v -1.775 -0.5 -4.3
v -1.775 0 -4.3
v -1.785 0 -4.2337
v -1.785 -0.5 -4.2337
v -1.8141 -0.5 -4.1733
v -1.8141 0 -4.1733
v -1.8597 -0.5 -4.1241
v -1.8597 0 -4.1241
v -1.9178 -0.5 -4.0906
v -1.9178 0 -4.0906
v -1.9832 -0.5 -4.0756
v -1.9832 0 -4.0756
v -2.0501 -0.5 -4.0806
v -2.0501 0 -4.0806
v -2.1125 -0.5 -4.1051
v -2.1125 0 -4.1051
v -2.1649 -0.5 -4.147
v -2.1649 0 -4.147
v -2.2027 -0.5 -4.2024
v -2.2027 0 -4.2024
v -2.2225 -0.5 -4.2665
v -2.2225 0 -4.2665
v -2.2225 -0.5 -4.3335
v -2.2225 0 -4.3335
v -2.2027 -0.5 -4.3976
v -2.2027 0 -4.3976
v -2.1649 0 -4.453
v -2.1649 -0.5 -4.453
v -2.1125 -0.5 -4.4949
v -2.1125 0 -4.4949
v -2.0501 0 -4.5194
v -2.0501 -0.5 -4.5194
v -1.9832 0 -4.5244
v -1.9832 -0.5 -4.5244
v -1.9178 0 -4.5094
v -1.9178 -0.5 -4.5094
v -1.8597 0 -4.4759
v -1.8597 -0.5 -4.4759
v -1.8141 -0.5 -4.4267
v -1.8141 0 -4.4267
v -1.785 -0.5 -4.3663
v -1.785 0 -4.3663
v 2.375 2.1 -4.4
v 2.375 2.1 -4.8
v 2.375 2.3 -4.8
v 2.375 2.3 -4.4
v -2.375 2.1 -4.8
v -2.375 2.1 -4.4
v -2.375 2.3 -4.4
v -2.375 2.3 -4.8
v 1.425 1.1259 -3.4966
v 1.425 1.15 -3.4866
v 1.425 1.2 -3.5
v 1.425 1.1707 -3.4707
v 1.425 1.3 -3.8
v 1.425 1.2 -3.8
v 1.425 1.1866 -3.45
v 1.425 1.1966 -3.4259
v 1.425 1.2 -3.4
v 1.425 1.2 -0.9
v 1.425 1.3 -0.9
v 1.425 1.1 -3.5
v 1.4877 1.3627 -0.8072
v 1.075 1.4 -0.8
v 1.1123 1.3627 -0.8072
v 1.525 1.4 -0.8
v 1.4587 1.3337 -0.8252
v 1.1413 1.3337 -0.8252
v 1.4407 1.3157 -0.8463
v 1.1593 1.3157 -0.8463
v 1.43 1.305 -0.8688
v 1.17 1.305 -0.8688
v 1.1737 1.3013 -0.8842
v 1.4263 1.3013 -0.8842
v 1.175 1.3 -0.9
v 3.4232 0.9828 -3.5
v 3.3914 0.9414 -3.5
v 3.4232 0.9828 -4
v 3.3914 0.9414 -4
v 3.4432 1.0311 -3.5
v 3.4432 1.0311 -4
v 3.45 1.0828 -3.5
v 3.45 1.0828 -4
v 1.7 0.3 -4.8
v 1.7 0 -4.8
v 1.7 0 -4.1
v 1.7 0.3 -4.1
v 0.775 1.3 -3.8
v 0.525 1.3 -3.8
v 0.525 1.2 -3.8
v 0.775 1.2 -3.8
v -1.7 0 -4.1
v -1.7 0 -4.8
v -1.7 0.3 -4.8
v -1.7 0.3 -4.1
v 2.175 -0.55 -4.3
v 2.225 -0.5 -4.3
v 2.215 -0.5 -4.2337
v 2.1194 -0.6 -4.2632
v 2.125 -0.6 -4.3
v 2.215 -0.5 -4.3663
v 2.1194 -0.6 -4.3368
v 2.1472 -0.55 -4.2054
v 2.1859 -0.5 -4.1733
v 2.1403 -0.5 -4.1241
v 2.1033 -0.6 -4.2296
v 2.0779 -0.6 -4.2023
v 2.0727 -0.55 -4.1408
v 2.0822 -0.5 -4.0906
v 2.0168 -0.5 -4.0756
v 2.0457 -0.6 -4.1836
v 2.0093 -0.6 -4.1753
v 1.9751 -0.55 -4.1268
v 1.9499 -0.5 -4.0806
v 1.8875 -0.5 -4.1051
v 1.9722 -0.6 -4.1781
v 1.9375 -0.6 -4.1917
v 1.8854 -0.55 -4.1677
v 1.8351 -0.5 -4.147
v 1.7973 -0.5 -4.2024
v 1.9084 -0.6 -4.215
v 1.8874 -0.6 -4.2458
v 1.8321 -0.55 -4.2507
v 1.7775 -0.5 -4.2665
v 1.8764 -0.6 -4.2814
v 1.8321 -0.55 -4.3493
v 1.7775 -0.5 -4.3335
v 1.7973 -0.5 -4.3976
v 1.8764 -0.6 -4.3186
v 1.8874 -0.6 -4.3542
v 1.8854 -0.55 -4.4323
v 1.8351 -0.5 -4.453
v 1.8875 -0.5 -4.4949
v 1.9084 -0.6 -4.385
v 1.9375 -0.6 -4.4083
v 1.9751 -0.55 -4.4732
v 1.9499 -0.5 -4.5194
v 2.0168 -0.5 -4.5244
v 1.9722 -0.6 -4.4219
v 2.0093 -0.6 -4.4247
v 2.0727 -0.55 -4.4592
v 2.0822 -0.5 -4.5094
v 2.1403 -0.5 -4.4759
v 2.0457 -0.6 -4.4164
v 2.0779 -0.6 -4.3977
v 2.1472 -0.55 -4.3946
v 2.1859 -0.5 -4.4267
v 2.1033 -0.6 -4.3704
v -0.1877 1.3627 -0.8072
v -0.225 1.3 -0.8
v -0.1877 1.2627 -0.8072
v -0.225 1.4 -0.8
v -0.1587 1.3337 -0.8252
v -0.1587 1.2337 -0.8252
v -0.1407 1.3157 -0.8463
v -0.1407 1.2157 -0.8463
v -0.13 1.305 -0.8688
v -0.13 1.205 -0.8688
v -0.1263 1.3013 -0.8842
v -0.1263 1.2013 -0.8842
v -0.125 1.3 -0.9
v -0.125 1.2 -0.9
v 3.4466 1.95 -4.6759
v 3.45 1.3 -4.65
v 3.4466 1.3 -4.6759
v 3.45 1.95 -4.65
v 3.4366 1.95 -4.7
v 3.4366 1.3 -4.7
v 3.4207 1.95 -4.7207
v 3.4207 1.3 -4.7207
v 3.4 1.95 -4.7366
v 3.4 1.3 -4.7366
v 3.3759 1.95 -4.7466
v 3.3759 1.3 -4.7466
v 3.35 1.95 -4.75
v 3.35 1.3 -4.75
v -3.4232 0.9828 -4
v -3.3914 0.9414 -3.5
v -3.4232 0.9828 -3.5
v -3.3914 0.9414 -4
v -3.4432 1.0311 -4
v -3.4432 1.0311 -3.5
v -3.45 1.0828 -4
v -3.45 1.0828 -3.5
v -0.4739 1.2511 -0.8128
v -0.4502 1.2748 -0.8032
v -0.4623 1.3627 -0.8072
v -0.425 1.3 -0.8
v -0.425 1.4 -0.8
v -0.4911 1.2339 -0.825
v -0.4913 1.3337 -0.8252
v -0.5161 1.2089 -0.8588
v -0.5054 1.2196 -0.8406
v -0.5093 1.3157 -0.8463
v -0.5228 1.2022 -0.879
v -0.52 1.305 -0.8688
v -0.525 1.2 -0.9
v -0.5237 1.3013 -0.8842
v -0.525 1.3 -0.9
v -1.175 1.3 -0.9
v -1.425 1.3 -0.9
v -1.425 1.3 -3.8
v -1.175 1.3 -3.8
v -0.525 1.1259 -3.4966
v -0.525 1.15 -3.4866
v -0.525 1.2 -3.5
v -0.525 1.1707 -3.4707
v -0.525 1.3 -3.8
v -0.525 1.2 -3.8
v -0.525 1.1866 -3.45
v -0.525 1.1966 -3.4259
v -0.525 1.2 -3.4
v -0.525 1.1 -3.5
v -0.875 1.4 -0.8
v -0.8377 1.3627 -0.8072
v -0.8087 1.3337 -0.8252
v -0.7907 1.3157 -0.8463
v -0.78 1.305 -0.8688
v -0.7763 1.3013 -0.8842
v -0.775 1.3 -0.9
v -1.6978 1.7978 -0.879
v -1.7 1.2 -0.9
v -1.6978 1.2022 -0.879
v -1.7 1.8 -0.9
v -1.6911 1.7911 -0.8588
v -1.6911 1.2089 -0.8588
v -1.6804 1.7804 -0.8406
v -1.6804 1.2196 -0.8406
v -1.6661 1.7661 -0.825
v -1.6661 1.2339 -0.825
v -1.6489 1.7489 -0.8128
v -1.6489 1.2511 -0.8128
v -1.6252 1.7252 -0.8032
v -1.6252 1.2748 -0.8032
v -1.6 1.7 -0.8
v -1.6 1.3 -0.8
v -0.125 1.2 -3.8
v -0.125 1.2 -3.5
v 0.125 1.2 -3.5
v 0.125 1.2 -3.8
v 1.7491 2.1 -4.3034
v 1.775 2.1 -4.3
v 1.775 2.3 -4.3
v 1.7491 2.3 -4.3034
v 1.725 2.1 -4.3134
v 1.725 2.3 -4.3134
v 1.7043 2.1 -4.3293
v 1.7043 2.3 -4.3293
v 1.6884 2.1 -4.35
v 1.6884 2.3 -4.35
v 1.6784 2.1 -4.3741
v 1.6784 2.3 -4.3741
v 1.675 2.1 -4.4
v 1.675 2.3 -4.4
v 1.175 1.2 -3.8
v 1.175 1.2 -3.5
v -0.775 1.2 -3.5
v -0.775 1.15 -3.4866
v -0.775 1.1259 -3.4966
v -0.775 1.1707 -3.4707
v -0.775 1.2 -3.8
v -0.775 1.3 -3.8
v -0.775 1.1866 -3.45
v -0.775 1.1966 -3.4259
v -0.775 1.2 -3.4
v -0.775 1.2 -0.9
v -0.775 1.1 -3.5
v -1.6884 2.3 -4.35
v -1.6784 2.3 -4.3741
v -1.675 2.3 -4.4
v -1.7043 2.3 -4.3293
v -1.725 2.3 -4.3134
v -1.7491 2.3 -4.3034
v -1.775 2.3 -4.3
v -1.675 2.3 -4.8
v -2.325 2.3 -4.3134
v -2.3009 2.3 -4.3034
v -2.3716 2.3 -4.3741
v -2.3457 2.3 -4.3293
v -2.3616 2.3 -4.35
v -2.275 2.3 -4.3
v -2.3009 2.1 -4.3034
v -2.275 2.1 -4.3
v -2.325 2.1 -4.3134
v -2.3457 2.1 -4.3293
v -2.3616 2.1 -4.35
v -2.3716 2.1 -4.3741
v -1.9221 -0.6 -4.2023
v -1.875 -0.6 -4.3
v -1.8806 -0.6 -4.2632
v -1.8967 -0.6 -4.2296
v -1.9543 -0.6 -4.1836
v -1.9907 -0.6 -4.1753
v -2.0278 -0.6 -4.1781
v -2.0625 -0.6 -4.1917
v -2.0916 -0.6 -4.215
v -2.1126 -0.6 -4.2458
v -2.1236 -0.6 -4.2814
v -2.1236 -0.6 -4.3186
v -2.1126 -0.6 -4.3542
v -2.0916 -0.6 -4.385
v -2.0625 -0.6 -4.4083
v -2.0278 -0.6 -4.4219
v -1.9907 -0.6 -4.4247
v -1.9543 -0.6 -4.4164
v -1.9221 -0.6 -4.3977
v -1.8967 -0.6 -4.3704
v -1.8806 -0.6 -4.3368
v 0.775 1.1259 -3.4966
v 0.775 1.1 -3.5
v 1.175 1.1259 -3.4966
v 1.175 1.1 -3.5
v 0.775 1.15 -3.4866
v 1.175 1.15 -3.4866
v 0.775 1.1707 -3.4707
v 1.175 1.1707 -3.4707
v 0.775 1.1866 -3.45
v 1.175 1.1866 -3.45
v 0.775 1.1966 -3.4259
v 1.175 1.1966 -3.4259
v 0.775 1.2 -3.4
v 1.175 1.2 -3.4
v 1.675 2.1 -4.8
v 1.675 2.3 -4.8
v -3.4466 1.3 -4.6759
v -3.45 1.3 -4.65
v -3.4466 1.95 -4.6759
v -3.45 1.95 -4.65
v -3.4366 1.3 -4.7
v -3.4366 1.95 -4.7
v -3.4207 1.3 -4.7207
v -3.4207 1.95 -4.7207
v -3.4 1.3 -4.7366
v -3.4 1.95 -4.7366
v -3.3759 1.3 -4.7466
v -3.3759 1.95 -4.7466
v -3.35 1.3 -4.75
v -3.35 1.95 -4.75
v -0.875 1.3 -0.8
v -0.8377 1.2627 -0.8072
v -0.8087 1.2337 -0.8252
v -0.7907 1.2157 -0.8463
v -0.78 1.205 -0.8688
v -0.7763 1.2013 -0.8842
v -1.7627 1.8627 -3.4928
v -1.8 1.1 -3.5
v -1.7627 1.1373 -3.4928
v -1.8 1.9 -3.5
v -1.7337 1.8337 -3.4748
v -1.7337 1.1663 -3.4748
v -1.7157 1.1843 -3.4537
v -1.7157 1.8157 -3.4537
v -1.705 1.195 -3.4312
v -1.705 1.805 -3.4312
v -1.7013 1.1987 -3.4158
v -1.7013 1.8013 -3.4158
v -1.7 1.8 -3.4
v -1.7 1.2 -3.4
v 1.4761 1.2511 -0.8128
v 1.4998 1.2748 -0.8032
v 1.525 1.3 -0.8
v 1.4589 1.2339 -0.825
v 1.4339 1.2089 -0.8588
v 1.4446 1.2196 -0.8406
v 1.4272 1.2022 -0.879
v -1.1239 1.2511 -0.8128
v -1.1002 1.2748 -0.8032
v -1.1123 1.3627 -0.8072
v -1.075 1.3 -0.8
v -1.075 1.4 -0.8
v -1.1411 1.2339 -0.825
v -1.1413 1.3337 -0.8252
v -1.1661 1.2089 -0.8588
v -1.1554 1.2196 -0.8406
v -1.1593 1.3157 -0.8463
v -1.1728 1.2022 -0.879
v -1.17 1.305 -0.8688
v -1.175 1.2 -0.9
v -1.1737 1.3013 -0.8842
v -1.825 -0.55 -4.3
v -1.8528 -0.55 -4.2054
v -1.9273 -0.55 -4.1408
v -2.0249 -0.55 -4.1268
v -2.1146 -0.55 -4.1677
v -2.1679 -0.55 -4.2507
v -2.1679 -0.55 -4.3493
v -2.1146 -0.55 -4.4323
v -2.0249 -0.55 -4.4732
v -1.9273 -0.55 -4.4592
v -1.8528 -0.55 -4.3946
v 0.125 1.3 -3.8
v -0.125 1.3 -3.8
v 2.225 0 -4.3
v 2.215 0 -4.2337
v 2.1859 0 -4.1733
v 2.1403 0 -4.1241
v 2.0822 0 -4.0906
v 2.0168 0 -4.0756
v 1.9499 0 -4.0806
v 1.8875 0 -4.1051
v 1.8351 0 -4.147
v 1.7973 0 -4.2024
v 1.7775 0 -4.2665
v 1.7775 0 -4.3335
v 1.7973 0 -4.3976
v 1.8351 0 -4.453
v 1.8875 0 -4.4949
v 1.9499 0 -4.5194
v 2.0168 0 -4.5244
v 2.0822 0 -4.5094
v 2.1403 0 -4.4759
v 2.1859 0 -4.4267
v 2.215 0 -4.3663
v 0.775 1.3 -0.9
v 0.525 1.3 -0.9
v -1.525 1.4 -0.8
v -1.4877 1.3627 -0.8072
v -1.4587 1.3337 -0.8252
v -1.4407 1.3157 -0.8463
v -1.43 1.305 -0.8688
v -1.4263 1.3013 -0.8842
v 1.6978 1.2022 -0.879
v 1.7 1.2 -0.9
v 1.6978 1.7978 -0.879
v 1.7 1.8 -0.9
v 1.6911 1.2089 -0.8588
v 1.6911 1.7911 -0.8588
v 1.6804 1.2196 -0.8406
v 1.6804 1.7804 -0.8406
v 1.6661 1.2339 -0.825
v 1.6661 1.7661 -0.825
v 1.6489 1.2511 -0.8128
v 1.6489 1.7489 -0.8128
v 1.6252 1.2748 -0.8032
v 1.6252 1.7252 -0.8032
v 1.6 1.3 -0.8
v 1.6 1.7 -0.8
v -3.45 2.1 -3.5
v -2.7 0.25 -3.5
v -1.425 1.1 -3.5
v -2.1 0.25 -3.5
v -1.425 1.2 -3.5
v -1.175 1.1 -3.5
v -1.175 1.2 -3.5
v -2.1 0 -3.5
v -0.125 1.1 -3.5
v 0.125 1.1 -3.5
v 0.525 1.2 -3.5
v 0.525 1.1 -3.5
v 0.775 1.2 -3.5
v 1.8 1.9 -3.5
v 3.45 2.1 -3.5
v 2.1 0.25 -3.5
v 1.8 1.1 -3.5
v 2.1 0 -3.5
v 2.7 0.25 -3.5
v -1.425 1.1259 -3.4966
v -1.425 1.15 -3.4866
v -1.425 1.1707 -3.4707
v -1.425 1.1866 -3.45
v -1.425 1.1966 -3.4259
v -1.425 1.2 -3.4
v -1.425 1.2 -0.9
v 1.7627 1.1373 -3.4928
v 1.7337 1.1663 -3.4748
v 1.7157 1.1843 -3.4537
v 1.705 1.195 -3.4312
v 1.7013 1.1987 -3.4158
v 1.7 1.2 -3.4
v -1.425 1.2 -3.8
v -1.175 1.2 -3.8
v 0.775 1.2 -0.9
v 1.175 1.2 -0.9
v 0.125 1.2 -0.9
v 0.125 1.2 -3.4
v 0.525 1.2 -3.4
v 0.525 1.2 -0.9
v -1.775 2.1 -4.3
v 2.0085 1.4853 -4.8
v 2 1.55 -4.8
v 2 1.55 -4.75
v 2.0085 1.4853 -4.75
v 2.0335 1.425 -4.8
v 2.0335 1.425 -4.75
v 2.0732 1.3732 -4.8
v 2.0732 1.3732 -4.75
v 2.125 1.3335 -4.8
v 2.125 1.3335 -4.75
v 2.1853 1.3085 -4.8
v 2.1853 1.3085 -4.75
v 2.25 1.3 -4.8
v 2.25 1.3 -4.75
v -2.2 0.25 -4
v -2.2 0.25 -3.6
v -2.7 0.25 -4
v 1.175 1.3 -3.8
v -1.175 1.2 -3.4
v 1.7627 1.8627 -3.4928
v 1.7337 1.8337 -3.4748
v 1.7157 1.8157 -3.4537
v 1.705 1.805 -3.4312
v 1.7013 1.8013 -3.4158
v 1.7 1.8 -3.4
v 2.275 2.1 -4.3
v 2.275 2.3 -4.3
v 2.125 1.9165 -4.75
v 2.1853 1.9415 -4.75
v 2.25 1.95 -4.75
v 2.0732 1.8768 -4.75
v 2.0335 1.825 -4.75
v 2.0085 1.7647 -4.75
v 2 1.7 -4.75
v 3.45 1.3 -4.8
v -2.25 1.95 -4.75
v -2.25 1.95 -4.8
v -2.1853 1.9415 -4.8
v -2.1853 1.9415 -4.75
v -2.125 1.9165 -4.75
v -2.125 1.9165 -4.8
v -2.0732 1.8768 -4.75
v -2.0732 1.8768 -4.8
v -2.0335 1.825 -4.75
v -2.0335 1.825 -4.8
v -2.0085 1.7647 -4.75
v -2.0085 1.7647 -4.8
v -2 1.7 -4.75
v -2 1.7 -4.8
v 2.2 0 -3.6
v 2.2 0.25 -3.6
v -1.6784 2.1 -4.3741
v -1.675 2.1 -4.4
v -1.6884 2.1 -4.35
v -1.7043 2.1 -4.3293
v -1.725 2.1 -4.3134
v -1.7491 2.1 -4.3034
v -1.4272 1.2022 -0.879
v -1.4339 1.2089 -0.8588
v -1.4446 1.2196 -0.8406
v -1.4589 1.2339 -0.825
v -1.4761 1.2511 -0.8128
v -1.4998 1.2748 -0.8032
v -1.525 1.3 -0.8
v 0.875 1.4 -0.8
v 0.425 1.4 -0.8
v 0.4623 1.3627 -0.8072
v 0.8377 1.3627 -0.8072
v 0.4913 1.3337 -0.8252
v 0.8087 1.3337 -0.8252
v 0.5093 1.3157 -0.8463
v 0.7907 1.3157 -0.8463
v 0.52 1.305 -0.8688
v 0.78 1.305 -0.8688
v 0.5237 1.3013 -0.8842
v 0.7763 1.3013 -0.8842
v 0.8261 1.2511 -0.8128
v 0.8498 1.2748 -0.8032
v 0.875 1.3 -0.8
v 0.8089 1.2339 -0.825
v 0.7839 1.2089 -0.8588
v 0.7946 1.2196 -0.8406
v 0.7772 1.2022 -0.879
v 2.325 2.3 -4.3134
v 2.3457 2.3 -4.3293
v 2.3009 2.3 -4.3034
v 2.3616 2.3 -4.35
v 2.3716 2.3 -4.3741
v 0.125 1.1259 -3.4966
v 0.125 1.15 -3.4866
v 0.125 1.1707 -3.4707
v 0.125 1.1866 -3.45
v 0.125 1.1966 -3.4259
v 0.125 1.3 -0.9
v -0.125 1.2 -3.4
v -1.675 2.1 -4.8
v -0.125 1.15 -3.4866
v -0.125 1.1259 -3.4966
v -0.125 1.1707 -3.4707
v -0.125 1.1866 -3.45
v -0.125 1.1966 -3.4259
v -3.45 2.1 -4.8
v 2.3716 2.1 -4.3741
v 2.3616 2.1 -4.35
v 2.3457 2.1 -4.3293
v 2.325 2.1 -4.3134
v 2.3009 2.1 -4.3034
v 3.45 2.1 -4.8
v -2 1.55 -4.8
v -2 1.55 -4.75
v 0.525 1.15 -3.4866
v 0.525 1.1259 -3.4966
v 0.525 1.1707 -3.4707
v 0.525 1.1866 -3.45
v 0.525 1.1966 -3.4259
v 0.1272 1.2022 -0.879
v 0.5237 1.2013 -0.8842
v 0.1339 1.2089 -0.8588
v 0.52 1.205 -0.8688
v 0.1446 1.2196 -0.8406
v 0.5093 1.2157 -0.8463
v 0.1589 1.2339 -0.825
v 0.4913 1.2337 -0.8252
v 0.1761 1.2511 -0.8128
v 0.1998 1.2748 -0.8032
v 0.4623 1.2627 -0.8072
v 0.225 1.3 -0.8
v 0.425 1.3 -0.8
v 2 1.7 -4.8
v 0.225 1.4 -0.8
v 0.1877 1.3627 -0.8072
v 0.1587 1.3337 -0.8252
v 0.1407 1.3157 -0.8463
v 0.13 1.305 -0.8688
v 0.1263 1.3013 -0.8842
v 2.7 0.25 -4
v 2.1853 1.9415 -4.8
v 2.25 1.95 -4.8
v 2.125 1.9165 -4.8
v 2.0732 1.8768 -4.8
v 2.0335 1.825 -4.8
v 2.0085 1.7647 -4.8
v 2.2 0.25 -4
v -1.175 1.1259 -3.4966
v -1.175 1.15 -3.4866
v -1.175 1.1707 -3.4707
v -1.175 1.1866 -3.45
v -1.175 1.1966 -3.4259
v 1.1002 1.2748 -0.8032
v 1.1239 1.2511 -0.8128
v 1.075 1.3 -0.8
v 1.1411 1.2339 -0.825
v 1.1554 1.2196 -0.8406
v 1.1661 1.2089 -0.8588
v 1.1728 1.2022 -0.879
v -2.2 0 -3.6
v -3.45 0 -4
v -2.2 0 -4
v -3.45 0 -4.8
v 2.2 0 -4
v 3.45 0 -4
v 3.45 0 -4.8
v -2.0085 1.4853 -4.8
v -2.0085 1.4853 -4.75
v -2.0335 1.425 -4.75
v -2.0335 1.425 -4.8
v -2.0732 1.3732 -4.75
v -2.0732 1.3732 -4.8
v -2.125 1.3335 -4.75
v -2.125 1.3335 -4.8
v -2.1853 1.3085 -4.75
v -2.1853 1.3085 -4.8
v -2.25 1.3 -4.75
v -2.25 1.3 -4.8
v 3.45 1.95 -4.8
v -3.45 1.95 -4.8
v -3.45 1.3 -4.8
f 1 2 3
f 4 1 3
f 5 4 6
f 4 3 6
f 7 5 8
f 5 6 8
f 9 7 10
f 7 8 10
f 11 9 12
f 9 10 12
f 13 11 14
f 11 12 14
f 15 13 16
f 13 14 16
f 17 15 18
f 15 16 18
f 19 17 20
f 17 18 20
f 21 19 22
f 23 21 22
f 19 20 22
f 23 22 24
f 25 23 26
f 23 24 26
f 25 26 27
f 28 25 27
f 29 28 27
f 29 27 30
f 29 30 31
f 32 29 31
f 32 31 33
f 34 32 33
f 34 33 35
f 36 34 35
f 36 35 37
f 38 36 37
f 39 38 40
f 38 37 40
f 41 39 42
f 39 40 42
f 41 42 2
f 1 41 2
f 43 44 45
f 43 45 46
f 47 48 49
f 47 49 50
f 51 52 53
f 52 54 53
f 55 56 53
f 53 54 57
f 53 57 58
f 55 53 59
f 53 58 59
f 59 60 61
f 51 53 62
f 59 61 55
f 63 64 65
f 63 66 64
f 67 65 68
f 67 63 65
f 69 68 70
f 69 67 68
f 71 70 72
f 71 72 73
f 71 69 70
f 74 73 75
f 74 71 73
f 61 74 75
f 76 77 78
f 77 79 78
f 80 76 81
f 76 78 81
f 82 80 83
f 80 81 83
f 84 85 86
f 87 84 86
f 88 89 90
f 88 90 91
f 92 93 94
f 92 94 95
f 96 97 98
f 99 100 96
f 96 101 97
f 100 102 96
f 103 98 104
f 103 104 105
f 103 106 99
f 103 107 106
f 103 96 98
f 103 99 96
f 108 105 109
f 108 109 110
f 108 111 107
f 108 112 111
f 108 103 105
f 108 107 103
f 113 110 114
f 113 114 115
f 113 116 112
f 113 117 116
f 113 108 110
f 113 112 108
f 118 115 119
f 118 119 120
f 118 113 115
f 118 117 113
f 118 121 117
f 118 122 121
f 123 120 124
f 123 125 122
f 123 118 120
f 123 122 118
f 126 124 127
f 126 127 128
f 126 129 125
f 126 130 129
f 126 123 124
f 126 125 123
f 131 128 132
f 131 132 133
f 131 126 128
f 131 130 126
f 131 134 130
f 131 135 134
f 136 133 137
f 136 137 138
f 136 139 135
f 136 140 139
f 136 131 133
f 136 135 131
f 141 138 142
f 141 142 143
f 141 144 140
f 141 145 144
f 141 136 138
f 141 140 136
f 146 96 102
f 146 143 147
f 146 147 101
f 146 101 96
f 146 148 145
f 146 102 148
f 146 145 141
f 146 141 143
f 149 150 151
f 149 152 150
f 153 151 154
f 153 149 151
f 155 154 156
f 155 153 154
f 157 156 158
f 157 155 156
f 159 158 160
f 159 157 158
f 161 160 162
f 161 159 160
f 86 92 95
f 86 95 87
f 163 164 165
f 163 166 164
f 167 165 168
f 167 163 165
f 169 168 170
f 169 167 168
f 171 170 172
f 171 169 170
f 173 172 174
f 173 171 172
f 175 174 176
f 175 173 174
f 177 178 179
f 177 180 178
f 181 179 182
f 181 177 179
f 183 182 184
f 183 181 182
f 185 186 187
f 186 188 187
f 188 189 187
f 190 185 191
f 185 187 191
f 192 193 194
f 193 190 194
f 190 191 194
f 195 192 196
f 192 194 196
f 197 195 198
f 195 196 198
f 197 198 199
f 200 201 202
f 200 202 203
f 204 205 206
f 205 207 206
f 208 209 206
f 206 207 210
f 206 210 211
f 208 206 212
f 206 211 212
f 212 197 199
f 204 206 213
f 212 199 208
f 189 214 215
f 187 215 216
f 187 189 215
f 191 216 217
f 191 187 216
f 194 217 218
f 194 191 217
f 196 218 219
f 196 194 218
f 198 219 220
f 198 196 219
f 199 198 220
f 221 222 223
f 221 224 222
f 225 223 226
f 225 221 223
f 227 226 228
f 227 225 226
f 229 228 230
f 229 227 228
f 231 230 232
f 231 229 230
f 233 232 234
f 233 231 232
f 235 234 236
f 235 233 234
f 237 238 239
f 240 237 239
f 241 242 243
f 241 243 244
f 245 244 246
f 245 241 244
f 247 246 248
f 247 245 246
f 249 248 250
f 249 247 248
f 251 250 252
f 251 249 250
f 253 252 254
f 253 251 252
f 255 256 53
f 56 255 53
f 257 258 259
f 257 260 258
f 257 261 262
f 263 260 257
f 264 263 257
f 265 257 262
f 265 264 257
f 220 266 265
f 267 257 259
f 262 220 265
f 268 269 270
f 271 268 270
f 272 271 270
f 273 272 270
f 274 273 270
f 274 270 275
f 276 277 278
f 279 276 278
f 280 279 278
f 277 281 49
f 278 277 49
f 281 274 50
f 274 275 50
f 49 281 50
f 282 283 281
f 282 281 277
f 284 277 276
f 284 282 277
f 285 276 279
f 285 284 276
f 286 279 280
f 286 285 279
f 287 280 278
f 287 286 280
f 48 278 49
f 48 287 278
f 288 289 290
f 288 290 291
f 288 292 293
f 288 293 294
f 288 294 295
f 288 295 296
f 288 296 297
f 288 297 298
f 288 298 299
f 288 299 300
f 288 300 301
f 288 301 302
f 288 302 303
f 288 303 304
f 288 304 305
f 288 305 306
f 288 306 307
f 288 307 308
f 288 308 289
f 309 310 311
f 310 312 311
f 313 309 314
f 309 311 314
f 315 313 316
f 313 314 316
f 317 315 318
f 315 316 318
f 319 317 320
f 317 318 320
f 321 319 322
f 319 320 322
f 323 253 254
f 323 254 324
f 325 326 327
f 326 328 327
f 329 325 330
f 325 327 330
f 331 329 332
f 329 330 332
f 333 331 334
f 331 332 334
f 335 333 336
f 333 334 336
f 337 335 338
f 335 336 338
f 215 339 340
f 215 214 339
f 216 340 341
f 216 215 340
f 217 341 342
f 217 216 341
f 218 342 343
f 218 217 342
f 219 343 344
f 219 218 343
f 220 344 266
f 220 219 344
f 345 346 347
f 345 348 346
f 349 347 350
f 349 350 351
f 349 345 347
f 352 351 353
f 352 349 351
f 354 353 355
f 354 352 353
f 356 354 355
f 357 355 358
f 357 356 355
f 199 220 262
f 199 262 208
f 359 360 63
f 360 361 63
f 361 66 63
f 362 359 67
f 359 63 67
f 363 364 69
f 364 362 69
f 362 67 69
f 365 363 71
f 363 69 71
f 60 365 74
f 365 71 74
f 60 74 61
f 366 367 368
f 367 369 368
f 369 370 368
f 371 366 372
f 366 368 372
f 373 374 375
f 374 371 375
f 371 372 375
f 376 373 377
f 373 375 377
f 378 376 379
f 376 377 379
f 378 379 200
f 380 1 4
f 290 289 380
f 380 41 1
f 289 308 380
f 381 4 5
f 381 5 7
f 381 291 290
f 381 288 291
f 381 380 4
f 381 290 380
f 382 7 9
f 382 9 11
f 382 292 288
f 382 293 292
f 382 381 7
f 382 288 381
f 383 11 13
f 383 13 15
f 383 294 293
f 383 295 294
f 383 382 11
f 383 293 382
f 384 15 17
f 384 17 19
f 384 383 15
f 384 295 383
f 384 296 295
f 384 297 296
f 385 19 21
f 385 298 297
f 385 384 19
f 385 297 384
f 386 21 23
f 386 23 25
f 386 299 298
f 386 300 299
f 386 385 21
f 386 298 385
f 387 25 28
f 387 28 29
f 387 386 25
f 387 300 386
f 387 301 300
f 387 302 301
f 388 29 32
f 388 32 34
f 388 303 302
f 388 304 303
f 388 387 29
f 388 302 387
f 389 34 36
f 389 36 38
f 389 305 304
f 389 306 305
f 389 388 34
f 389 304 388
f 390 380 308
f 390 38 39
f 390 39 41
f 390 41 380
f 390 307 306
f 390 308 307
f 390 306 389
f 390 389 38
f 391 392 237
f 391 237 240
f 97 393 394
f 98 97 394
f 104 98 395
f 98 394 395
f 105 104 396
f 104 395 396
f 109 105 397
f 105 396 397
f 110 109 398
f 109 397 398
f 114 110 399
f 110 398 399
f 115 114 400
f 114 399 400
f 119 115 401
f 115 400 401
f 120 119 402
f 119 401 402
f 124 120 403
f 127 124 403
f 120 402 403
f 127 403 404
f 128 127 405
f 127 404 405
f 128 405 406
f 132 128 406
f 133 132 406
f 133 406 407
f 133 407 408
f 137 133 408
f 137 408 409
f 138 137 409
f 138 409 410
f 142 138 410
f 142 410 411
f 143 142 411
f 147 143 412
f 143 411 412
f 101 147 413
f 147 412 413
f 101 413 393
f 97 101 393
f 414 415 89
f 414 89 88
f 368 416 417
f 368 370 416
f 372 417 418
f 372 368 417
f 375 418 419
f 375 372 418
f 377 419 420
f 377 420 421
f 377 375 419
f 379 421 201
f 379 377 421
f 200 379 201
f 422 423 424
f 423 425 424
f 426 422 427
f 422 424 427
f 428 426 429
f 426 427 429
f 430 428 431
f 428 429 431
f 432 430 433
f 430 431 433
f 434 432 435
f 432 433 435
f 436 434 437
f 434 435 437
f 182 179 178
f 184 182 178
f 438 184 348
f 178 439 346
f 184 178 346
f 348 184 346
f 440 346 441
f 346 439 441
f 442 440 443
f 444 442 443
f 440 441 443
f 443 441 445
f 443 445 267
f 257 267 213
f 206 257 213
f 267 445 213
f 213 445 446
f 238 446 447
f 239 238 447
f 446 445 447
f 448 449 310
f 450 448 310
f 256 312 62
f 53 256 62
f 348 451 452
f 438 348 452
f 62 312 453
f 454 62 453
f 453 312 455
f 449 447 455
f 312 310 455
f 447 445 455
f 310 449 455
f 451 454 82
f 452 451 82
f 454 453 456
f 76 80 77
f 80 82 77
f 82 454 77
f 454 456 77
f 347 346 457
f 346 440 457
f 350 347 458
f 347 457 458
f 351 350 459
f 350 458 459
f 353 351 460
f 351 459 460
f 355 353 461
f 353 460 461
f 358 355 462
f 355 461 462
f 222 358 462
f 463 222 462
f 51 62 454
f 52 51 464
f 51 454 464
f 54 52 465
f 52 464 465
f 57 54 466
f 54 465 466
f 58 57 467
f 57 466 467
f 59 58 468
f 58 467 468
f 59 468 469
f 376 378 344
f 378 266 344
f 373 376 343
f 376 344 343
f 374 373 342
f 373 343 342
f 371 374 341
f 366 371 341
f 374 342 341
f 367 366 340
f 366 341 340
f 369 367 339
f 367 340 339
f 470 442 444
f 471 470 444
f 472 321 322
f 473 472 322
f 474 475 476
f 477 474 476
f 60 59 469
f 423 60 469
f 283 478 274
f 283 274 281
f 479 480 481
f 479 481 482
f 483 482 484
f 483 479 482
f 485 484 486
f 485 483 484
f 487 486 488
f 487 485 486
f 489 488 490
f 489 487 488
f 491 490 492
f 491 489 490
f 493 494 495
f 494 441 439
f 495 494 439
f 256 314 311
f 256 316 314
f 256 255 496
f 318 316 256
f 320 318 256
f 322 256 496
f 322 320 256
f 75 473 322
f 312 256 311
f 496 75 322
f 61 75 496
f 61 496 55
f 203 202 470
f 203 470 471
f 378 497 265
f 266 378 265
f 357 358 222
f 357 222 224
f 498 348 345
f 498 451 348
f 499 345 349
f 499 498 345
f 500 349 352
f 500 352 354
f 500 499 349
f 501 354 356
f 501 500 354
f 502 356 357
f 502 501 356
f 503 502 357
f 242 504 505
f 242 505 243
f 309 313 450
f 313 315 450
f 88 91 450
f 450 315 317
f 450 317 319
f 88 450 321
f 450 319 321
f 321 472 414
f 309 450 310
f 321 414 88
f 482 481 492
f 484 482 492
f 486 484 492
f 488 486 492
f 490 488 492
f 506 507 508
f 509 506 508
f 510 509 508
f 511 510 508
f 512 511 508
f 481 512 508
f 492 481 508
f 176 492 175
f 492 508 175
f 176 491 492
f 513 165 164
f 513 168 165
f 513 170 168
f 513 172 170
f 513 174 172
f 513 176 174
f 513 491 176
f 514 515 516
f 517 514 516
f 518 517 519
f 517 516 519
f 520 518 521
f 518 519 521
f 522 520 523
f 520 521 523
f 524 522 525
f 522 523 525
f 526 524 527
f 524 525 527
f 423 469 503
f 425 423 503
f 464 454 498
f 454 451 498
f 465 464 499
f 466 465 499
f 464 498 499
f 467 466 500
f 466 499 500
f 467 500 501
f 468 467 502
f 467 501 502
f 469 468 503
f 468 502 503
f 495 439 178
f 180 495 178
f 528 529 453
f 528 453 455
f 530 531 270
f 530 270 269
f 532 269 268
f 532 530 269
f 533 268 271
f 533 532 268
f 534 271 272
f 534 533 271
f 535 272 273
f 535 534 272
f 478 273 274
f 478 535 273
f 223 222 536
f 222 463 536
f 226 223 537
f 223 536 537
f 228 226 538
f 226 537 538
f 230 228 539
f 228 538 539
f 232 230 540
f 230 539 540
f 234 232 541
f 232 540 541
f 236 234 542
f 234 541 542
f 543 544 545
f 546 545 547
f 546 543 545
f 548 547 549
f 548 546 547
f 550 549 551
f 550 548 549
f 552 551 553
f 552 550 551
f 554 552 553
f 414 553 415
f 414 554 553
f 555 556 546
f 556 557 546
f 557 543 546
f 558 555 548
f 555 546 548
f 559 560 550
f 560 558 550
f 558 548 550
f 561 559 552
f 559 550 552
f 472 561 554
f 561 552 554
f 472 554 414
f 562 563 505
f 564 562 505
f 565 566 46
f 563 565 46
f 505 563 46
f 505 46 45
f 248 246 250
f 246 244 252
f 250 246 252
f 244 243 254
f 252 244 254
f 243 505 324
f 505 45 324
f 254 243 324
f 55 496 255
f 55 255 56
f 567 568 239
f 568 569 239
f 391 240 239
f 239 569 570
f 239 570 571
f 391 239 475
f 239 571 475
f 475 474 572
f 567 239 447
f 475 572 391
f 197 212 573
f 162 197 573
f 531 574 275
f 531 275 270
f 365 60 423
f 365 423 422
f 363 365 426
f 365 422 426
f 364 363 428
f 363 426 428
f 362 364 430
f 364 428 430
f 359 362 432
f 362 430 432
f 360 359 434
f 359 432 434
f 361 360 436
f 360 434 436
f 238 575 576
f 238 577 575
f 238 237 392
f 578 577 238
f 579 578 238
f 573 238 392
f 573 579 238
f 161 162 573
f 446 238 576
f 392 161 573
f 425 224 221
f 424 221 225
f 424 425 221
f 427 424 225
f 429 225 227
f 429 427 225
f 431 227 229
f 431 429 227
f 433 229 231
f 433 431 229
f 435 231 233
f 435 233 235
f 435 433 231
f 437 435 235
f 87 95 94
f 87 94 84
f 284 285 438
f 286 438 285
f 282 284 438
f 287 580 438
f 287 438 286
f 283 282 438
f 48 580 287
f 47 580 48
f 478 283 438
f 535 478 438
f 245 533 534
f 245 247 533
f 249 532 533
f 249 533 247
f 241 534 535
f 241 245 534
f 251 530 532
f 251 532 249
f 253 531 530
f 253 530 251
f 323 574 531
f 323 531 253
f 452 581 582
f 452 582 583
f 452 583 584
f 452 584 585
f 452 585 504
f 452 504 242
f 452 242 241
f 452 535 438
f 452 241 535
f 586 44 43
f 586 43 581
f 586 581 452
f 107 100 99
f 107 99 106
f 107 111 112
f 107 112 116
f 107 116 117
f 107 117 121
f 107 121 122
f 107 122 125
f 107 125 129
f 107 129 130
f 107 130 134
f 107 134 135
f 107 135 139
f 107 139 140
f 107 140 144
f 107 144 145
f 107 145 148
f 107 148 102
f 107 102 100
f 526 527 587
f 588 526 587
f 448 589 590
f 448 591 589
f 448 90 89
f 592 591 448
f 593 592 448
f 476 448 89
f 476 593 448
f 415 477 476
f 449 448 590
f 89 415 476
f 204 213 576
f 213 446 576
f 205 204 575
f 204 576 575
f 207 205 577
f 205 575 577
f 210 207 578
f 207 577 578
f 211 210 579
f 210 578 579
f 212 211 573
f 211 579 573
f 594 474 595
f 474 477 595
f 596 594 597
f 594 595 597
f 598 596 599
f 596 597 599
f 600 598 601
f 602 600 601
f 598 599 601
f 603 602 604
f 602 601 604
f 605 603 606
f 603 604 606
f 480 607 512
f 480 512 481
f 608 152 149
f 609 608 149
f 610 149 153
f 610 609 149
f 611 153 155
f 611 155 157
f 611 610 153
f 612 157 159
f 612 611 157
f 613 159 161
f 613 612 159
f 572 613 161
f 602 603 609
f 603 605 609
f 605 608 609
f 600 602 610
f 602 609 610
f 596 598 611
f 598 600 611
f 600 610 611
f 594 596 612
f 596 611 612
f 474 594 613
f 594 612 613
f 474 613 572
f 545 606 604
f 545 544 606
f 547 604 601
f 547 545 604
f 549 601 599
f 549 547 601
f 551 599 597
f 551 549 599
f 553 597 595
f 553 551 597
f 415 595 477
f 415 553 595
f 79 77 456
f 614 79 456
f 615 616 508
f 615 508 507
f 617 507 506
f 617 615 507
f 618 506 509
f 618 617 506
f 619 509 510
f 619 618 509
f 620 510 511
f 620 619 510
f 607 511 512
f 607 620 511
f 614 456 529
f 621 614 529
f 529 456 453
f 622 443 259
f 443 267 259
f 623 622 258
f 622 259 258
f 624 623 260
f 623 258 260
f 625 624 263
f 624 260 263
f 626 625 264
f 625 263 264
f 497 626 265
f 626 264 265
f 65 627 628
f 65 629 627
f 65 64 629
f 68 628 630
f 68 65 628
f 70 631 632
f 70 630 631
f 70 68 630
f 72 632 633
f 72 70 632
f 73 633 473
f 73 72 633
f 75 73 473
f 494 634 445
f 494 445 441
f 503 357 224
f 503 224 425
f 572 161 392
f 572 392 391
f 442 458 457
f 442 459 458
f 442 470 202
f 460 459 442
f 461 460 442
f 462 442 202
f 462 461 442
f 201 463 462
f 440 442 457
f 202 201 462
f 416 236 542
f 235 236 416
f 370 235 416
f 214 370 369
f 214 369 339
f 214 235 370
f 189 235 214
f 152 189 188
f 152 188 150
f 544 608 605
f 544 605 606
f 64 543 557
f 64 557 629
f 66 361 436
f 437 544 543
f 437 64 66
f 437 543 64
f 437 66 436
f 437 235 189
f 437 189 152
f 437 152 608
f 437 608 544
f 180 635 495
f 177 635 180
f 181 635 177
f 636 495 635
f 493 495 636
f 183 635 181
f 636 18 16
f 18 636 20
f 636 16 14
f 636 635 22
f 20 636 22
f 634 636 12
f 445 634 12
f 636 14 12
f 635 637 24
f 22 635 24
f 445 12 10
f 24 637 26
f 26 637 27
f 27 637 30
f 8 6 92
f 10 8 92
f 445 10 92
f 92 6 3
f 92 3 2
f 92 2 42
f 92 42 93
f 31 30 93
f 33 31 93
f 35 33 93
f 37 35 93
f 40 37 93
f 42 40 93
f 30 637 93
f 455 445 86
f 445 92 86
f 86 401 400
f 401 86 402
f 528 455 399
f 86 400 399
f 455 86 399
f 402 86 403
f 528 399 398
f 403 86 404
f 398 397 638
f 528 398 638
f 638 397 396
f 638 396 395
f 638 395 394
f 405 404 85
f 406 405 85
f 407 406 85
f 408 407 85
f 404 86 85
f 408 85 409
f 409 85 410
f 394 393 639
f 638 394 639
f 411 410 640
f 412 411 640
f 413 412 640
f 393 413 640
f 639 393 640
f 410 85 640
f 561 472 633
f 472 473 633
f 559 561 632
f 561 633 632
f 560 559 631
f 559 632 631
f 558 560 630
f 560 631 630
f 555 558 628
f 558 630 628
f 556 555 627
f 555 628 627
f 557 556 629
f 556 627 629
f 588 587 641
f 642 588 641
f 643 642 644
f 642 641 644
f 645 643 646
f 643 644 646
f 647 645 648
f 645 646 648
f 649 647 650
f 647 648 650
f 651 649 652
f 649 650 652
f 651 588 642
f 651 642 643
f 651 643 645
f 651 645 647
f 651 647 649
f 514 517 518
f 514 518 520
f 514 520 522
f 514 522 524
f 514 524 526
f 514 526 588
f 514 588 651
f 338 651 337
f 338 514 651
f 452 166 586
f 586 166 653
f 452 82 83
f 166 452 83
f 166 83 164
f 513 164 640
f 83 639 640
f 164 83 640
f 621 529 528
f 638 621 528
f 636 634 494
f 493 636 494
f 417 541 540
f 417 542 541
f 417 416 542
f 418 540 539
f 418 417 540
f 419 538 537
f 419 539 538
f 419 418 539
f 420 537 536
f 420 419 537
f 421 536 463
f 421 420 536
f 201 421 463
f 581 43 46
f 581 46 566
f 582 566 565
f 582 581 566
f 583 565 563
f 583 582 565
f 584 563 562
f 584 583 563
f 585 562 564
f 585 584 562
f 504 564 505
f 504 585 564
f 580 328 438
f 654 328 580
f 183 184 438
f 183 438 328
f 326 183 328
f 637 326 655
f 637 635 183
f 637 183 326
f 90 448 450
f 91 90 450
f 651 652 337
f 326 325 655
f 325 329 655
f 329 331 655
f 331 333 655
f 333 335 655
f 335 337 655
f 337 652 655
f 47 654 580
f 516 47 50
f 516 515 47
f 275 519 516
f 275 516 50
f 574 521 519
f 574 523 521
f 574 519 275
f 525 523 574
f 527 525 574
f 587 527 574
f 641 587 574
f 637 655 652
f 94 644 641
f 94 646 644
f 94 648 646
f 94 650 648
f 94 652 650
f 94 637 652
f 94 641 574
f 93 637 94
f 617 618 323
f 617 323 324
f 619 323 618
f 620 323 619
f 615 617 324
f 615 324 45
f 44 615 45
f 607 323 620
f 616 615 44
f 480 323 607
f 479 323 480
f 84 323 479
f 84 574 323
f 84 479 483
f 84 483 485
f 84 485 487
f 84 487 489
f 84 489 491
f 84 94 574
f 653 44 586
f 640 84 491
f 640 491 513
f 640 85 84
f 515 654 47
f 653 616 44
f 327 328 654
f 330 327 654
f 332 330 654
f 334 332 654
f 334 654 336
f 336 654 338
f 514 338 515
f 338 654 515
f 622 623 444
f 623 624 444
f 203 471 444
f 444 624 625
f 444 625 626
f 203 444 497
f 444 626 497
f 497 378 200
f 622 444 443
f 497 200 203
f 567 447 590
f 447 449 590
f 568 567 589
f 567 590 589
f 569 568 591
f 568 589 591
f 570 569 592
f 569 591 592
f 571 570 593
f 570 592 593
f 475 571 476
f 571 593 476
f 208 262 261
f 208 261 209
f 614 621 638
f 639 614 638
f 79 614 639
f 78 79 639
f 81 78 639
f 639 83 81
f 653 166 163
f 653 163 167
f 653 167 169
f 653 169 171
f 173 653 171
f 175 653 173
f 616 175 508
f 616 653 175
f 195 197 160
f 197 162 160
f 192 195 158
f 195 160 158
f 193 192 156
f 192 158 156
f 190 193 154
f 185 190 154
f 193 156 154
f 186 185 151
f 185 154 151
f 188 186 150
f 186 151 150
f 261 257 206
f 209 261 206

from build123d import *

# Parameters (mm, degrees)
SKETCH1_W           = 6.9
SKETCH1_H           = 1.3
BOSS_EXTRUDE1_DEPTH = 2.1
SKETCH2_W           = 3.4
SKETCH2_H           = 0.6
BOSS_EXTRUDE2_DEPTH = 2.7
SKETCH3_W           = 0.25
SKETCH3_H           = 0.1
CUT_EXTRUDE1_DEPTH  = 3
FILLET1_R           = 0.1
CUT_EXTRUDE2_DEPTH  = 0.5
FILLET3_R           = 0.2
CHAMFER1_SIZE       = 0.1
CUT_EXTRUDE3_DEPTH  = 0.05
FILLET4_R           = 0.1
SKETCH6_R           = 0.225
BOSS_EXTRUDE3_DEPTH = 0.6
CHAMFER2_SIZE       = 0.1
SKETCH7_W           = 3.4
SKETCH7_H           = 0.7
CUT_EXTRUDE4_DEPTH  = 0.3
BOSS_EXTRUDE4_DEPTH = 0.2


with BuildPart() as part:
    # Sketch1 → Boss-Extrude1 (new body)
    with BuildSketch(Plane(origin=(0, 0, 0), x_dir=(1, 0, 0), z_dir=(0, 1, 0))):
        with Locations((0, 4.15)):
            Rectangle(SKETCH1_W, SKETCH1_H)
    extrude(amount=BOSS_EXTRUDE1_DEPTH)

    # Sketch2 → Boss-Extrude2 (add)
    with BuildSketch(Plane.XY.offset(-3.5)):
        with Locations((0, 1.5)):
            Rectangle(SKETCH2_W, SKETCH2_H)
    extrude(amount=BOSS_EXTRUDE2_DEPTH)

    # Sketch3 → Cut-Extrude1 (cut)
    with BuildSketch(Plane.XY.offset(-0.8)):
        with Locations((-1.3, 1.25)):
            Rectangle(SKETCH3_W, SKETCH3_H)
        with Locations((-0.65, 1.25)):
            Rectangle(SKETCH3_W, SKETCH3_H)
        with Locations((0, 1.25)):
            Rectangle(SKETCH3_W, SKETCH3_H)
        with Locations((0.65, 1.25)):
            Rectangle(SKETCH3_W, SKETCH3_H)
        with Locations((1.3, 1.25)):
            Rectangle(SKETCH3_W, SKETCH3_H)
    extrude(amount=-CUT_EXTRUDE1_DEPTH, mode=Mode.SUBTRACT)

    # Fillet1
    fillet1_edges = [part.edges().sort_by_distance(p)[0] for p in [
        (0, 1.8, -0.8),
        (1.7, 1.5, -0.8),
        (1.5625, 1.2, -0.8),
        (-1.5625, 1.2, -0.8),
        (-1.7, 1.5, -0.8),
        (-1.7, 1.5, -3.5),
        (0, 1.8, -3.5),
        (1.7, 1.5, -3.5),
        (1.5625, 1.2, -3.5),
        (-1.5625, 1.2, -3.5),
        (0.975, 1.2, -0.8),
        (0.775, 1.25, -0.8),
        (0.65, 1.3, -0.8),
        (0.525, 1.25, -0.8),
        (0.325, 1.2, -0.8),
        (0.125, 1.25, -0.8),
        (0, 1.3, -0.8),
        (-0.125, 1.25, -0.8),
        (-0.325, 1.2, -0.8),
        (-0.525, 1.25, -0.8),
        (-0.65, 1.3, -0.8),
        (-0.775, 1.25, -0.8),
        (-0.975, 1.2, -0.8),
        (-1.175, 1.25, -0.8),
        (-1.3, 1.3, -0.8),
        (-1.425, 1.25, -0.8),
        (1.425, 1.25, -0.8),
        (1.3, 1.3, -0.8),
        (1.175, 1.25, -0.8),
        (0.975, 1.2, -3.5),
        (0.325, 1.2, -3.5),
        (-0.325, 1.2, -3.5),
        (-0.975, 1.2, -3.5),
    ]]
    fillet(fillet1_edges, radius=FILLET1_R)

    # Sketch4 → Cut-Extrude2 (cut)
    with BuildSketch(Plane.XY.offset(-3.5)):
        Polygon((-2.7, 0.25), (-3.45, 1), (-3.45, 0), (-2.2, 0), (-2.2, 0.25), align=None)
        Polygon((3.45, 1), (2.7, 0.25), (2.2, 0.25), (2.2, 0), (3.45, 0), align=None)
    extrude(amount=-CUT_EXTRUDE2_DEPTH, mode=Mode.SUBTRACT)

    # Fillet3
    fillet3_edges = [part.edges().sort_by_distance(p)[0] for p in [
        (-3.45, 1, -3.75),
        (3.45, 1, -3.75),
    ]]
    fillet(fillet3_edges, radius=FILLET3_R)

    # Chamfer1
    chamfer1_edges = [part.edges().sort_by_distance(p)[0] for p in [
        (-2.2, 0.125, -3.5),
        (2.2, 0.125, -3.5),
    ]]
    chamfer(chamfer1_edges, length=CHAMFER1_SIZE)

    # Sketch5 → Cut-Extrude3 (cut)
    with BuildSketch(Plane(origin=(0, 0, -4.8), x_dir=(-1, 0, 0), z_dir=(0, 0, -1))):
        with BuildLine():
            Line((-3.45, 1.95), (-2.25, 1.95))
            ThreePointArc((-2.25, 1.95), (-2.073223305, 1.876776695), (-2, 1.7))
            Line((-2, 1.7), (-2, 1.55))
            ThreePointArc((-2, 1.55), (-2.073223305, 1.373223305), (-2.25, 1.3))
            Line((-2.25, 1.3), (-3.45, 1.3))
            Line((-3.45, 1.3), (-3.45, 1.95))
        make_face()
        with BuildLine():
            Line((3.45, 1.95), (2.25, 1.95))
            ThreePointArc((2.25, 1.95), (2.073223305, 1.876776695), (2, 1.7))
            Line((2, 1.7), (2, 1.55))
            ThreePointArc((2, 1.55), (2.073223305, 1.373223305), (2.25, 1.3))
            Line((2.25, 1.3), (3.45, 1.3))
            Line((3.45, 1.3), (3.45, 1.95))
        make_face()
    extrude(amount=-CUT_EXTRUDE3_DEPTH, mode=Mode.SUBTRACT)

    # Fillet4
    fillet4_edges = [part.edges().sort_by_distance(p)[0] for p in [
        (3.45, 1.625, -4.75),
        (-3.45, 1.625, -4.75),
    ]]
    fillet(fillet4_edges, radius=FILLET4_R)

    # Sketch6 → Boss-Extrude3 (add)
    with BuildSketch(Plane.XZ):
        with Locations((2, -4.3)):
            Circle(SKETCH6_R)
        with Locations((-2, -4.3)):
            Circle(SKETCH6_R)
    extrude(amount=BOSS_EXTRUDE3_DEPTH)

    # Chamfer2
    chamfer2_edges = [part.edges().sort_by_distance(p)[0] for p in [
        (1.775, -0.6, -4.3),
        (-2.225, -0.6, -4.3),
    ]]
    chamfer(chamfer2_edges, length=CHAMFER2_SIZE)

    # Sketch7 → Cut-Extrude4 (cut)
    with BuildSketch(Plane.XZ):
        with Locations((0, -4.45)):
            Rectangle(SKETCH7_W, SKETCH7_H)
    extrude(amount=-CUT_EXTRUDE4_DEPTH, mode=Mode.SUBTRACT)

    # Sketch8 → Boss-Extrude4 (add)
    with BuildSketch(Plane(origin=(0, 2.1, 0), x_dir=(1, 0, 0), z_dir=(0, 1, 0))):
        with BuildLine():
            Line((-2.375, 4.8), (-1.675, 4.8))
            Line((-1.675, 4.8), (-1.675, 4.4))
            ThreePointArc((-1.675, 4.4), (-1.704289322, 4.329289322), (-1.775, 4.3))
            Line((-1.775, 4.3), (-2.275, 4.3))
            ThreePointArc((-2.275, 4.3), (-2.345710678, 4.329289322), (-2.375, 4.4))
            Line((-2.375, 4.4), (-2.375, 4.8))
        make_face()
        with BuildLine():
            Line((1.675, 4.8), (2.375, 4.8))
            Line((2.375, 4.8), (2.375, 4.4))
            ThreePointArc((2.375, 4.4), (2.345710678, 4.329289322), (2.275, 4.3))
            Line((2.275, 4.3), (1.775, 4.3))
            ThreePointArc((1.775, 4.3), (1.704289322, 4.329289322), (1.675, 4.4))
            Line((1.675, 4.4), (1.675, 4.8))
        make_face()
    extrude(amount=BOSS_EXTRUDE4_DEPTH)


solid = part.part
